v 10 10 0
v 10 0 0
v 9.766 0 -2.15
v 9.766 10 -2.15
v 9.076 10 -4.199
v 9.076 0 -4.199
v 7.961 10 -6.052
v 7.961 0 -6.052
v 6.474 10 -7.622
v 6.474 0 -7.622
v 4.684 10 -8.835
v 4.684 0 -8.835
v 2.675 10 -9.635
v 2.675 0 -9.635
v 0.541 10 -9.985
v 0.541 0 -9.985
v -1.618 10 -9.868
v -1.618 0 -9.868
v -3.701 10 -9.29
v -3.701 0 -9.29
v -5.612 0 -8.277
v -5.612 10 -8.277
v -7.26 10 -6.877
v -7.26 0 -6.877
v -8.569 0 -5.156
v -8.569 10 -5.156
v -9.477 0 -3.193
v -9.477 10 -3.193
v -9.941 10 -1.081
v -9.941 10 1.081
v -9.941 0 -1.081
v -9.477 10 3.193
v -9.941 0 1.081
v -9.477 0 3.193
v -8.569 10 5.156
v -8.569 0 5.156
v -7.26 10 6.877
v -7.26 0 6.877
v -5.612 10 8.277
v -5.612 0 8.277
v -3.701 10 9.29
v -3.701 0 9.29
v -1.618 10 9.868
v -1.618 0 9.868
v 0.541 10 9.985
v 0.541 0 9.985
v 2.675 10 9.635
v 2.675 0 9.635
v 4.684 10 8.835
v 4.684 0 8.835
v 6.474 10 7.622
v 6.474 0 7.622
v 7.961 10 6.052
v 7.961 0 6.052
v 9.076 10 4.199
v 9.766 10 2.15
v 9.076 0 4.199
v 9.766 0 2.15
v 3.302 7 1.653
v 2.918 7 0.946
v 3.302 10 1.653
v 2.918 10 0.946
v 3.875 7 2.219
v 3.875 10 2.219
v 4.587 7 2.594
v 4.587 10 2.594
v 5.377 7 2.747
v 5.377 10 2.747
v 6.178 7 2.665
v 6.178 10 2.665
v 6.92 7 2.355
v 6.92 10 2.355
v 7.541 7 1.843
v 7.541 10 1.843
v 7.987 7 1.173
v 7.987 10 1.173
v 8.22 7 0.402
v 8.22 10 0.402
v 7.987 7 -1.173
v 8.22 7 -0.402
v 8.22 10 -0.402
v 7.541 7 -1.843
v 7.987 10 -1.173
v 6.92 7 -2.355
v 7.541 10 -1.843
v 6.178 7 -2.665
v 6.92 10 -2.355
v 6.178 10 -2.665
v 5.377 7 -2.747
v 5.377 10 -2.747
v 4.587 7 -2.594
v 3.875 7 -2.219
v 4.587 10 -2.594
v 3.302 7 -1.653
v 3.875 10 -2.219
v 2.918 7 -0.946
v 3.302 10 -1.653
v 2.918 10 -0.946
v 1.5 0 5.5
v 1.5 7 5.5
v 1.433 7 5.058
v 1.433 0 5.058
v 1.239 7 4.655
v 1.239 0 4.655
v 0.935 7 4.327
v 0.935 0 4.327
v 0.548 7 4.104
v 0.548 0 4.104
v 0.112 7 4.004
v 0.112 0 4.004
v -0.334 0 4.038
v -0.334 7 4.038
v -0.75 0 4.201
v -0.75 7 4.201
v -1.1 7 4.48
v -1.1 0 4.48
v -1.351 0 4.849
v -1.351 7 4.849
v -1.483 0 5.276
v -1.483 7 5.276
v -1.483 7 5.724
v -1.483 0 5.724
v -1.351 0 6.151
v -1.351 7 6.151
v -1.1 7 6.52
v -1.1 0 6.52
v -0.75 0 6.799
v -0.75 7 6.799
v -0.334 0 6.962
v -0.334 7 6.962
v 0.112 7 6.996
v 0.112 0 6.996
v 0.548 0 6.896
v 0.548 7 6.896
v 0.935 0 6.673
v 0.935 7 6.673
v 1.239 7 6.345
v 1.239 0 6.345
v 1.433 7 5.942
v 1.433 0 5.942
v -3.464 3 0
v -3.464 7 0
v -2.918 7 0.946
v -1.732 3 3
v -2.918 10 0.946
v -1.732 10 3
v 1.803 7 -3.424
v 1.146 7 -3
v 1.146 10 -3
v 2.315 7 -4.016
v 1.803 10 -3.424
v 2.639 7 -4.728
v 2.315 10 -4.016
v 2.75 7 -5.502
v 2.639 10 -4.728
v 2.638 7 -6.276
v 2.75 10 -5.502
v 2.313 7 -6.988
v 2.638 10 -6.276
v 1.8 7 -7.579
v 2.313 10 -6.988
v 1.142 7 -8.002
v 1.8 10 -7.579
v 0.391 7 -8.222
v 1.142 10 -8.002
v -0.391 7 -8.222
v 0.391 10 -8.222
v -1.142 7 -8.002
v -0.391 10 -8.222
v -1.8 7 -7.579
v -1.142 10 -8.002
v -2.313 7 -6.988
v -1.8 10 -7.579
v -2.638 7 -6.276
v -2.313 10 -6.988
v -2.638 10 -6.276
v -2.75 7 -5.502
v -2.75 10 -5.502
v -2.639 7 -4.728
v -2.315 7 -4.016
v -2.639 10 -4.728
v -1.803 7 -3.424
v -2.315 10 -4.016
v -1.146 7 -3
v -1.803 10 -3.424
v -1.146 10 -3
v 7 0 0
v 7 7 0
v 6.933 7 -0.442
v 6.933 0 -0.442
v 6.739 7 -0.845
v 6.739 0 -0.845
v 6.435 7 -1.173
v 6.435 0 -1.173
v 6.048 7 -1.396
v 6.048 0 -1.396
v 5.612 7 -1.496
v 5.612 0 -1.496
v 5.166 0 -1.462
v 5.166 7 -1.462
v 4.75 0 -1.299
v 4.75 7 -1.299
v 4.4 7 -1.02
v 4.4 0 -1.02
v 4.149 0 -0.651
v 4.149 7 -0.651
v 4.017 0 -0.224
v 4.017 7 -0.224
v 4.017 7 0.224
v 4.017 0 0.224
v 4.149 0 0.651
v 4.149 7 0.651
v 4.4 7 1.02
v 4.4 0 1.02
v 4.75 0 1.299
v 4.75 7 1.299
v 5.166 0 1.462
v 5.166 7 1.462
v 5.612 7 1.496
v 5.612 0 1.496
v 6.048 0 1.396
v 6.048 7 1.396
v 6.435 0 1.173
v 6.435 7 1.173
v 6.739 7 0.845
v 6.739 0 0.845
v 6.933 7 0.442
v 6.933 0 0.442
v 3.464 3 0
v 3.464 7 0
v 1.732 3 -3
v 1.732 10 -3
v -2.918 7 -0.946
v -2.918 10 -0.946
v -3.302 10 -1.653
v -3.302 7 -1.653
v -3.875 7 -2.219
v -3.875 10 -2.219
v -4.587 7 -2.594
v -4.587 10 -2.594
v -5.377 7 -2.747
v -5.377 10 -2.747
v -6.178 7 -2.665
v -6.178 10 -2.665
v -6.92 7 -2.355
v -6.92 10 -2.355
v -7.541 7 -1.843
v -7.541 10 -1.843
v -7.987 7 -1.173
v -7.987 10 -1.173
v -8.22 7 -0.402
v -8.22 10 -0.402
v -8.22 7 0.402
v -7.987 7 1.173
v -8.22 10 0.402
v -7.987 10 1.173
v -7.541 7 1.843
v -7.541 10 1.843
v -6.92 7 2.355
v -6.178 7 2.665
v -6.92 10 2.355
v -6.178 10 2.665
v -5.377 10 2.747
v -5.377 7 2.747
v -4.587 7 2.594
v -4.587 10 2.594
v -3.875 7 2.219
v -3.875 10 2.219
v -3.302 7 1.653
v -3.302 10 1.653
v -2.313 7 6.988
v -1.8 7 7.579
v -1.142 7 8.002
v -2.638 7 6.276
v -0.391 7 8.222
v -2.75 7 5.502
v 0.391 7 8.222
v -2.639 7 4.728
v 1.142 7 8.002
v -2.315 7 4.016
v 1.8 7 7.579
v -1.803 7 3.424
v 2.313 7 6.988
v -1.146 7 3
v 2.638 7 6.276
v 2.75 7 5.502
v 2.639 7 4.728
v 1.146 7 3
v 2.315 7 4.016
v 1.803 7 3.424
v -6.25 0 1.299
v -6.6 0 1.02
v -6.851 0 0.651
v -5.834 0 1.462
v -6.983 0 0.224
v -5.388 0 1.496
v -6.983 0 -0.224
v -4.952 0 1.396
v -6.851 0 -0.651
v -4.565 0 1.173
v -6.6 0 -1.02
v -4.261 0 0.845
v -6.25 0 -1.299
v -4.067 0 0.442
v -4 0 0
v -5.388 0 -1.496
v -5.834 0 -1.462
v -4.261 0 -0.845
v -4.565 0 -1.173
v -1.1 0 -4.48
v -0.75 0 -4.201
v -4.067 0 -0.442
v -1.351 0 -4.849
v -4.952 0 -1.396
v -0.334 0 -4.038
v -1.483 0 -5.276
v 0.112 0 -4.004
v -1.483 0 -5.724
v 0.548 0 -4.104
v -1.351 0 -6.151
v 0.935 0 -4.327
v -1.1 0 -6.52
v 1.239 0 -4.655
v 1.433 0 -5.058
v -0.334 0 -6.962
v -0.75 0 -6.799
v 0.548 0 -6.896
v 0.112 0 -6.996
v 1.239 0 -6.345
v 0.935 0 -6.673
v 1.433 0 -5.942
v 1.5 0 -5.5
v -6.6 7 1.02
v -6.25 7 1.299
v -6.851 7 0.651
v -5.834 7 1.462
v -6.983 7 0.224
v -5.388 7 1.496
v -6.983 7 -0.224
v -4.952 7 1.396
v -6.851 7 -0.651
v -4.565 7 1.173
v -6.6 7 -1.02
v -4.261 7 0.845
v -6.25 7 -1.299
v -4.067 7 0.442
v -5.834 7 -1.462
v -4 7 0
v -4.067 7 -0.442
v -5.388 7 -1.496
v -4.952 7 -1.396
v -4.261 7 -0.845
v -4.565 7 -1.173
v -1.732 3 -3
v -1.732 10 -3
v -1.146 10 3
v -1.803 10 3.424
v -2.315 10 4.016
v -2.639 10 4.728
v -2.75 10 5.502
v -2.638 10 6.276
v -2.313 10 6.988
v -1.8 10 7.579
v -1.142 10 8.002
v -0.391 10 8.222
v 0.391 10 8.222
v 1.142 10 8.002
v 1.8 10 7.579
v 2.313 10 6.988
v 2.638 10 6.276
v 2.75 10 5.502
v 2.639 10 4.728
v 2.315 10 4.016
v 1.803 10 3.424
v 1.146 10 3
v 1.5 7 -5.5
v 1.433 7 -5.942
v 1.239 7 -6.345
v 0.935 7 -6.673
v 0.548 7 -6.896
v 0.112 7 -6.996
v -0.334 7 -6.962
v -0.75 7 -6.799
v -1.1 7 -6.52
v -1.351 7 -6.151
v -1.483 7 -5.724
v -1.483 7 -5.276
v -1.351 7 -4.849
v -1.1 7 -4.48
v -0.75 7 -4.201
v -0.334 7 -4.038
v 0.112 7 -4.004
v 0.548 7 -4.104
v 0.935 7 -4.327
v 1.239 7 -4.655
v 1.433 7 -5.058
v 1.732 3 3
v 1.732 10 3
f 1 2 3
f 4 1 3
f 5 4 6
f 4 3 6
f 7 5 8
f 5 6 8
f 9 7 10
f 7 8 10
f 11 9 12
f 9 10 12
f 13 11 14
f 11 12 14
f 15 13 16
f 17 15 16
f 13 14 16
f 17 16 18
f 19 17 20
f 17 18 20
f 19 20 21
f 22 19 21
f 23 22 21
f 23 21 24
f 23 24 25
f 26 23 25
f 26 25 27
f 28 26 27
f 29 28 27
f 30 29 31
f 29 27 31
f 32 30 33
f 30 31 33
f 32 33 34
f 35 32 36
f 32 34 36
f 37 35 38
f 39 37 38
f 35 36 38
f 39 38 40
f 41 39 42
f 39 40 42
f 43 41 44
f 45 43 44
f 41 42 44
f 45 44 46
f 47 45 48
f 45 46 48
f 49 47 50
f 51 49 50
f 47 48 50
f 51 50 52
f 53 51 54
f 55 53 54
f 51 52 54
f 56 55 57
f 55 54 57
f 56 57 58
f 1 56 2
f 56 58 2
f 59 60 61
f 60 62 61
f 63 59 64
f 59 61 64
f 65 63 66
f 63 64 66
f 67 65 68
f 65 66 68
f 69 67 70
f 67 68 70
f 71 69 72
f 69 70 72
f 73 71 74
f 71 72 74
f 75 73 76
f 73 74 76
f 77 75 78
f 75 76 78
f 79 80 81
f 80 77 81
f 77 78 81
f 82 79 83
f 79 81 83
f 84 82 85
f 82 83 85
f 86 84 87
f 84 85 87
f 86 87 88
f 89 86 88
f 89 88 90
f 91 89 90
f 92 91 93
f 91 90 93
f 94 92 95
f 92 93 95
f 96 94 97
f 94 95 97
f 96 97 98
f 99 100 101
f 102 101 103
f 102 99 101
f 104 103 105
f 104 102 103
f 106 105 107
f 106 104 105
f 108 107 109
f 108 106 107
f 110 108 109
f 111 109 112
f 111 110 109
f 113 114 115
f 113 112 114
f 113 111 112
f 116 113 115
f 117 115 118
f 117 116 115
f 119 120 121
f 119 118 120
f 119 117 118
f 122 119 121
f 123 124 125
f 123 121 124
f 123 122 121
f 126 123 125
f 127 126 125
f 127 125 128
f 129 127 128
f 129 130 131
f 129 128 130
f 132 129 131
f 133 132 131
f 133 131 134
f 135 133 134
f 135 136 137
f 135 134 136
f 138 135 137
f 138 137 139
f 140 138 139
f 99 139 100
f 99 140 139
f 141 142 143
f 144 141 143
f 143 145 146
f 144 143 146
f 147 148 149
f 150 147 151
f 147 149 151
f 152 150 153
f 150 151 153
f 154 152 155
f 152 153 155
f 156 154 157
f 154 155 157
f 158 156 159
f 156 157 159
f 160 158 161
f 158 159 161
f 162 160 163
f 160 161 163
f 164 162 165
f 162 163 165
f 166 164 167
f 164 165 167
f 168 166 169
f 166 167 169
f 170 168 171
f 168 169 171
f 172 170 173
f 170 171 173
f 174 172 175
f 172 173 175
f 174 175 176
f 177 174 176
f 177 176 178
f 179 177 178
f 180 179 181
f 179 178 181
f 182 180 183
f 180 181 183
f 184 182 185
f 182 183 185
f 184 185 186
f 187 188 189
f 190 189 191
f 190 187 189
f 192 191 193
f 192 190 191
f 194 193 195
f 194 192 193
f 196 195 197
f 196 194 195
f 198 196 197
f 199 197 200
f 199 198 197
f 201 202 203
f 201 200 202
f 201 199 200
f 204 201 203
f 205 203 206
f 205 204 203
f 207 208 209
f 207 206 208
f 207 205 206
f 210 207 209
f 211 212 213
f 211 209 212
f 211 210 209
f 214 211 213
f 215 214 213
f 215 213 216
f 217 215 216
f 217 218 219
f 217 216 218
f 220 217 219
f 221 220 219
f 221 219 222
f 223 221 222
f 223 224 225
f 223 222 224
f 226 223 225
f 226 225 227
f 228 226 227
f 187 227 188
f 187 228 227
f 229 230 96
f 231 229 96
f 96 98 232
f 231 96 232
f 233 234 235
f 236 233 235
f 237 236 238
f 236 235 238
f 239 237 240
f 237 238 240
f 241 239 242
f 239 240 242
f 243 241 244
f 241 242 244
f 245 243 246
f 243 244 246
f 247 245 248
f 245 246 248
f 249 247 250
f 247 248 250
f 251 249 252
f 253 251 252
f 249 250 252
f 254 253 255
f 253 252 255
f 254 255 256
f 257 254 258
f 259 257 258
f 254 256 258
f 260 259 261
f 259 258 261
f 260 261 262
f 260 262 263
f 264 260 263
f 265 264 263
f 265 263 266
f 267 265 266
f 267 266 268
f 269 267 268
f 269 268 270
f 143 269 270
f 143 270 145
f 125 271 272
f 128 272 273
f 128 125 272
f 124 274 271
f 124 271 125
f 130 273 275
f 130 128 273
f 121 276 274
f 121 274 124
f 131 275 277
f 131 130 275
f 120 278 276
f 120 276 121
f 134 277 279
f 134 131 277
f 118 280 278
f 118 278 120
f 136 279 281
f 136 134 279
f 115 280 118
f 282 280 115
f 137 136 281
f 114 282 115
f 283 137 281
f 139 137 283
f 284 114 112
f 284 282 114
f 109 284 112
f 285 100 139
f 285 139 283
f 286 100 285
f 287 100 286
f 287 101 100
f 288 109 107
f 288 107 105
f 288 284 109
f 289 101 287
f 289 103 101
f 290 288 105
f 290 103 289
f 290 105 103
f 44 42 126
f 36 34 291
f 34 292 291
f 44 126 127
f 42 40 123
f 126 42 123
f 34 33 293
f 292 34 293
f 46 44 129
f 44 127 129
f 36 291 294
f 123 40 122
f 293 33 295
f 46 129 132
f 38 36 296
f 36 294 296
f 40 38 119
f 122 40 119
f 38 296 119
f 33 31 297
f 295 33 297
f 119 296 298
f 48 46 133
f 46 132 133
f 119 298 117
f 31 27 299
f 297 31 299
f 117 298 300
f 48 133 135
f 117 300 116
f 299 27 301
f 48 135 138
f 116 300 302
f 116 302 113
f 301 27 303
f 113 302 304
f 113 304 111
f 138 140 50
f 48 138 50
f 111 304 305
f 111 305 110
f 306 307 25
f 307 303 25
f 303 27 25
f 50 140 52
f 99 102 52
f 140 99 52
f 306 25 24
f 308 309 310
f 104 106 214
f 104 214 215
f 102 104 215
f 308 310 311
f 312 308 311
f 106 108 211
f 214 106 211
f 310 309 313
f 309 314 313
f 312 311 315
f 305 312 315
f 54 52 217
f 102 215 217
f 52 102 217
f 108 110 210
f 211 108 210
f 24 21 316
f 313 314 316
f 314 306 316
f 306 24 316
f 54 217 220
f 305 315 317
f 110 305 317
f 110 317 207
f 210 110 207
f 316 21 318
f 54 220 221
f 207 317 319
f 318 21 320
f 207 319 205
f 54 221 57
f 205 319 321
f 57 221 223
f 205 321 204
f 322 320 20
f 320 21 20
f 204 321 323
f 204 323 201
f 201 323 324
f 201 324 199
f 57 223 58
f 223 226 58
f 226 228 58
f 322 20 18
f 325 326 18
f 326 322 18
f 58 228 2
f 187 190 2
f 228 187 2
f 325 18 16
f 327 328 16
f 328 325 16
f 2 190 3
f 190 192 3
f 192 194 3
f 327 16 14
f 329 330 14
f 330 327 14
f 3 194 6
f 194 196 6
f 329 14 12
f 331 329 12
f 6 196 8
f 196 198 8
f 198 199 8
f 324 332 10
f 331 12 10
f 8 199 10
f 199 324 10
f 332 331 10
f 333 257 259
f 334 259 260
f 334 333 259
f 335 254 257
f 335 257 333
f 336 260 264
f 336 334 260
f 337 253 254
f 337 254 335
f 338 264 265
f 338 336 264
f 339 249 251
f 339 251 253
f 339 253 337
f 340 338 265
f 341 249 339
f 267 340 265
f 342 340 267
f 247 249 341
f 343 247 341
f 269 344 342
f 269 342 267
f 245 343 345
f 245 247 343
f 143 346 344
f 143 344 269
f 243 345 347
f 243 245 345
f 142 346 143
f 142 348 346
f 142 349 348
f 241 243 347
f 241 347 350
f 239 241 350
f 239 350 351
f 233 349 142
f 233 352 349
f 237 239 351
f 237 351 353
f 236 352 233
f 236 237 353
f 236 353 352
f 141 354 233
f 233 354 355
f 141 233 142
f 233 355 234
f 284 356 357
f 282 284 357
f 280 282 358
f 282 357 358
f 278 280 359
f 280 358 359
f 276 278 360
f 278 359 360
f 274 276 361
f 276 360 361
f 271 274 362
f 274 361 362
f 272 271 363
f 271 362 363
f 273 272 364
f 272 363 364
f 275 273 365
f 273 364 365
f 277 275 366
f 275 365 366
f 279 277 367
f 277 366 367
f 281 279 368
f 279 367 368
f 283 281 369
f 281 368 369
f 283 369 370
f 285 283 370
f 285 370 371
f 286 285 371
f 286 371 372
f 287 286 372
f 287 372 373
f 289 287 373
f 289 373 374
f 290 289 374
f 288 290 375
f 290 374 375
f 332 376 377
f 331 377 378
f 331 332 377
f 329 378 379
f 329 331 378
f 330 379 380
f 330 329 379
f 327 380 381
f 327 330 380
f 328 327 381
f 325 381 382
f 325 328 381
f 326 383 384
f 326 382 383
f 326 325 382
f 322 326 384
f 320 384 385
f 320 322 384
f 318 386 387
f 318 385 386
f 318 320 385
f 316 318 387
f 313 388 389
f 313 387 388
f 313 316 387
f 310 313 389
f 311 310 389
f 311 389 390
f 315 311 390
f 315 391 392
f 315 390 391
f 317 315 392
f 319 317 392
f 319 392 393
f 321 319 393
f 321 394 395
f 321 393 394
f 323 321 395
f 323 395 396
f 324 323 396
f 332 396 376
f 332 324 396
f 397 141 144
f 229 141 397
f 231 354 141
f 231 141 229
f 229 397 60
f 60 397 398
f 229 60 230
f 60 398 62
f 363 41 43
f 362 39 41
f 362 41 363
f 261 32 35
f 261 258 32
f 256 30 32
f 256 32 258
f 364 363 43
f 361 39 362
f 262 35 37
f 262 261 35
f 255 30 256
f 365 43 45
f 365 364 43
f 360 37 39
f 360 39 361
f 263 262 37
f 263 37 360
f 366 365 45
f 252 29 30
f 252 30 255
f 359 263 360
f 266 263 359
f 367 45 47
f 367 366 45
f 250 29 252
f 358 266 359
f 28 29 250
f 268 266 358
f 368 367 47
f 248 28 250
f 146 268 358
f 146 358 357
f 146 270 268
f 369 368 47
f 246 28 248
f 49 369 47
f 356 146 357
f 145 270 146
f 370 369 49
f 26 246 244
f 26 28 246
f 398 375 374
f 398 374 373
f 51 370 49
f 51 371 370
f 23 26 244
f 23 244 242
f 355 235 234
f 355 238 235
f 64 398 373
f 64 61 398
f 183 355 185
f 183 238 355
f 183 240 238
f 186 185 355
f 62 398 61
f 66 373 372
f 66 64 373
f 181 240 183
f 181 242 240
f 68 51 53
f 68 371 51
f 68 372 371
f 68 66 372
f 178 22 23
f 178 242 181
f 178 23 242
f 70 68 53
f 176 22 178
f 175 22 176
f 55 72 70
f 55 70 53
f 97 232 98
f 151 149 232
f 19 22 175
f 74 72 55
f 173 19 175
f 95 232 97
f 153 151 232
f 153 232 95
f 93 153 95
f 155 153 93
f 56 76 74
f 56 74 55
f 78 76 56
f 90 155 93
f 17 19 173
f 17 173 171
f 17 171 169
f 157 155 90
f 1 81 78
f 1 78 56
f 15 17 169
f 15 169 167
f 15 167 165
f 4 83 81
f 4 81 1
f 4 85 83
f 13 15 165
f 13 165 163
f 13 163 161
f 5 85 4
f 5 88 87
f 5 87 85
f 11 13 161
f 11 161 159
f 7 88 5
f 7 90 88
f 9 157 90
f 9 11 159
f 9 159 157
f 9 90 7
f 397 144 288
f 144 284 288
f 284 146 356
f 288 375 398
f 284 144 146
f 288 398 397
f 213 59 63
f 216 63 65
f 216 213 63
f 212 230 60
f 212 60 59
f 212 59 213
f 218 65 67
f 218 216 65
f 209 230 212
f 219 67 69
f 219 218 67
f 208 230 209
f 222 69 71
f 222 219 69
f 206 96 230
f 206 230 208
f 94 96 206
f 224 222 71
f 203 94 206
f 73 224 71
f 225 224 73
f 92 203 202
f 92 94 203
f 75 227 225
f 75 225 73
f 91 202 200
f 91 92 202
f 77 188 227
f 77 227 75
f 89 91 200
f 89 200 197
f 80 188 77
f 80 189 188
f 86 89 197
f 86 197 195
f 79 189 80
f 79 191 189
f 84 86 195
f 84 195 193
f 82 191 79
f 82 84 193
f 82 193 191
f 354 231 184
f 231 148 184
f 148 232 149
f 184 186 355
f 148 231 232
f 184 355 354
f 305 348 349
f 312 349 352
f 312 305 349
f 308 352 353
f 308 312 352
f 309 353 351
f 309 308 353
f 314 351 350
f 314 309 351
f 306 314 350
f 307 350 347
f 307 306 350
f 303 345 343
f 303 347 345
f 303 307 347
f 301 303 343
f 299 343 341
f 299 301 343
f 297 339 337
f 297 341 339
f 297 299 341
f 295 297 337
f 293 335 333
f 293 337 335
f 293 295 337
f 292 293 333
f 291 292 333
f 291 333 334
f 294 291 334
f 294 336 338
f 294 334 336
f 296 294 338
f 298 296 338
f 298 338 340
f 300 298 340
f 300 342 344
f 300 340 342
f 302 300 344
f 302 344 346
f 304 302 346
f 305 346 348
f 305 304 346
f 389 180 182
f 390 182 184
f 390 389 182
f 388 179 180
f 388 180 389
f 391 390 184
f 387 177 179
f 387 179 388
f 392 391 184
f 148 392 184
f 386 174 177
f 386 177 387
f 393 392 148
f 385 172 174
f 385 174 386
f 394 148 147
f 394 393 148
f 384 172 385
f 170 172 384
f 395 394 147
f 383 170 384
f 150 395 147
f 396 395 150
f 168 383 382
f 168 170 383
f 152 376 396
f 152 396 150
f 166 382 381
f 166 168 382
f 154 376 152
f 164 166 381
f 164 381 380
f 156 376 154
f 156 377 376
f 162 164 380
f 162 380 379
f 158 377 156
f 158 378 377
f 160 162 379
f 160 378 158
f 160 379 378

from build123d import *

# Parameters (mm, degrees)
SKETCH1_R           = 10
SKETCH1_R_2         = 1.5
BOSS_EXTRUDE1_DEPTH = 10
SKETCH2_R           = 2.75
CUT_EXTRUDE1_DEPTH  = 3
CUT_EXTRUDE2_DEPTH  = 7


with BuildPart() as part:
    # Sketch1 → Boss-Extrude1 (new body)
    with BuildSketch(Plane(origin=(0, 0, 0), x_dir=(1, 0, 0), z_dir=(0, 1, 0))):
        Circle(SKETCH1_R)
        with Locations((0, 5.5)):
            Circle(SKETCH1_R_2, mode=Mode.SUBTRACT)
        with Locations((5.5, 0)):
            Circle(SKETCH1_R_2, mode=Mode.SUBTRACT)
        with Locations((0, -5.5)):
            Circle(SKETCH1_R_2, mode=Mode.SUBTRACT)
        with Locations((-5.5, 0)):
            Circle(SKETCH1_R_2, mode=Mode.SUBTRACT)
    extrude(amount=BOSS_EXTRUDE1_DEPTH)

    # Sketch2 → Cut-Extrude1 (cut)
    with BuildSketch(Plane(origin=(0, 10, 0), x_dir=(1, 0, 0), z_dir=(0, 1, 0))):
        with Locations((0, 5.5)):
            Circle(SKETCH2_R)
        with Locations((5.5, 0)):
            Circle(SKETCH2_R)
        with Locations((0, -5.5)):
            Circle(SKETCH2_R)
        with Locations((-5.5, 0)):
            Circle(SKETCH2_R)
    extrude(amount=-CUT_EXTRUDE1_DEPTH, mode=Mode.SUBTRACT)

    # Sketch3 → Cut-Extrude2 (cut)
    with BuildSketch(Plane(origin=(0, 10, 0), x_dir=(1, 0, 0), z_dir=(0, 1, 0))):
        Polygon((3.464101615, 0), (1.732050808, 3), (-1.732050808, 3), (-3.464101615, 0), (-1.732050808, -3), (1.732050808, -3), align=None)
    extrude(amount=-CUT_EXTRUDE2_DEPTH, mode=Mode.SUBTRACT)


solid = part.part
